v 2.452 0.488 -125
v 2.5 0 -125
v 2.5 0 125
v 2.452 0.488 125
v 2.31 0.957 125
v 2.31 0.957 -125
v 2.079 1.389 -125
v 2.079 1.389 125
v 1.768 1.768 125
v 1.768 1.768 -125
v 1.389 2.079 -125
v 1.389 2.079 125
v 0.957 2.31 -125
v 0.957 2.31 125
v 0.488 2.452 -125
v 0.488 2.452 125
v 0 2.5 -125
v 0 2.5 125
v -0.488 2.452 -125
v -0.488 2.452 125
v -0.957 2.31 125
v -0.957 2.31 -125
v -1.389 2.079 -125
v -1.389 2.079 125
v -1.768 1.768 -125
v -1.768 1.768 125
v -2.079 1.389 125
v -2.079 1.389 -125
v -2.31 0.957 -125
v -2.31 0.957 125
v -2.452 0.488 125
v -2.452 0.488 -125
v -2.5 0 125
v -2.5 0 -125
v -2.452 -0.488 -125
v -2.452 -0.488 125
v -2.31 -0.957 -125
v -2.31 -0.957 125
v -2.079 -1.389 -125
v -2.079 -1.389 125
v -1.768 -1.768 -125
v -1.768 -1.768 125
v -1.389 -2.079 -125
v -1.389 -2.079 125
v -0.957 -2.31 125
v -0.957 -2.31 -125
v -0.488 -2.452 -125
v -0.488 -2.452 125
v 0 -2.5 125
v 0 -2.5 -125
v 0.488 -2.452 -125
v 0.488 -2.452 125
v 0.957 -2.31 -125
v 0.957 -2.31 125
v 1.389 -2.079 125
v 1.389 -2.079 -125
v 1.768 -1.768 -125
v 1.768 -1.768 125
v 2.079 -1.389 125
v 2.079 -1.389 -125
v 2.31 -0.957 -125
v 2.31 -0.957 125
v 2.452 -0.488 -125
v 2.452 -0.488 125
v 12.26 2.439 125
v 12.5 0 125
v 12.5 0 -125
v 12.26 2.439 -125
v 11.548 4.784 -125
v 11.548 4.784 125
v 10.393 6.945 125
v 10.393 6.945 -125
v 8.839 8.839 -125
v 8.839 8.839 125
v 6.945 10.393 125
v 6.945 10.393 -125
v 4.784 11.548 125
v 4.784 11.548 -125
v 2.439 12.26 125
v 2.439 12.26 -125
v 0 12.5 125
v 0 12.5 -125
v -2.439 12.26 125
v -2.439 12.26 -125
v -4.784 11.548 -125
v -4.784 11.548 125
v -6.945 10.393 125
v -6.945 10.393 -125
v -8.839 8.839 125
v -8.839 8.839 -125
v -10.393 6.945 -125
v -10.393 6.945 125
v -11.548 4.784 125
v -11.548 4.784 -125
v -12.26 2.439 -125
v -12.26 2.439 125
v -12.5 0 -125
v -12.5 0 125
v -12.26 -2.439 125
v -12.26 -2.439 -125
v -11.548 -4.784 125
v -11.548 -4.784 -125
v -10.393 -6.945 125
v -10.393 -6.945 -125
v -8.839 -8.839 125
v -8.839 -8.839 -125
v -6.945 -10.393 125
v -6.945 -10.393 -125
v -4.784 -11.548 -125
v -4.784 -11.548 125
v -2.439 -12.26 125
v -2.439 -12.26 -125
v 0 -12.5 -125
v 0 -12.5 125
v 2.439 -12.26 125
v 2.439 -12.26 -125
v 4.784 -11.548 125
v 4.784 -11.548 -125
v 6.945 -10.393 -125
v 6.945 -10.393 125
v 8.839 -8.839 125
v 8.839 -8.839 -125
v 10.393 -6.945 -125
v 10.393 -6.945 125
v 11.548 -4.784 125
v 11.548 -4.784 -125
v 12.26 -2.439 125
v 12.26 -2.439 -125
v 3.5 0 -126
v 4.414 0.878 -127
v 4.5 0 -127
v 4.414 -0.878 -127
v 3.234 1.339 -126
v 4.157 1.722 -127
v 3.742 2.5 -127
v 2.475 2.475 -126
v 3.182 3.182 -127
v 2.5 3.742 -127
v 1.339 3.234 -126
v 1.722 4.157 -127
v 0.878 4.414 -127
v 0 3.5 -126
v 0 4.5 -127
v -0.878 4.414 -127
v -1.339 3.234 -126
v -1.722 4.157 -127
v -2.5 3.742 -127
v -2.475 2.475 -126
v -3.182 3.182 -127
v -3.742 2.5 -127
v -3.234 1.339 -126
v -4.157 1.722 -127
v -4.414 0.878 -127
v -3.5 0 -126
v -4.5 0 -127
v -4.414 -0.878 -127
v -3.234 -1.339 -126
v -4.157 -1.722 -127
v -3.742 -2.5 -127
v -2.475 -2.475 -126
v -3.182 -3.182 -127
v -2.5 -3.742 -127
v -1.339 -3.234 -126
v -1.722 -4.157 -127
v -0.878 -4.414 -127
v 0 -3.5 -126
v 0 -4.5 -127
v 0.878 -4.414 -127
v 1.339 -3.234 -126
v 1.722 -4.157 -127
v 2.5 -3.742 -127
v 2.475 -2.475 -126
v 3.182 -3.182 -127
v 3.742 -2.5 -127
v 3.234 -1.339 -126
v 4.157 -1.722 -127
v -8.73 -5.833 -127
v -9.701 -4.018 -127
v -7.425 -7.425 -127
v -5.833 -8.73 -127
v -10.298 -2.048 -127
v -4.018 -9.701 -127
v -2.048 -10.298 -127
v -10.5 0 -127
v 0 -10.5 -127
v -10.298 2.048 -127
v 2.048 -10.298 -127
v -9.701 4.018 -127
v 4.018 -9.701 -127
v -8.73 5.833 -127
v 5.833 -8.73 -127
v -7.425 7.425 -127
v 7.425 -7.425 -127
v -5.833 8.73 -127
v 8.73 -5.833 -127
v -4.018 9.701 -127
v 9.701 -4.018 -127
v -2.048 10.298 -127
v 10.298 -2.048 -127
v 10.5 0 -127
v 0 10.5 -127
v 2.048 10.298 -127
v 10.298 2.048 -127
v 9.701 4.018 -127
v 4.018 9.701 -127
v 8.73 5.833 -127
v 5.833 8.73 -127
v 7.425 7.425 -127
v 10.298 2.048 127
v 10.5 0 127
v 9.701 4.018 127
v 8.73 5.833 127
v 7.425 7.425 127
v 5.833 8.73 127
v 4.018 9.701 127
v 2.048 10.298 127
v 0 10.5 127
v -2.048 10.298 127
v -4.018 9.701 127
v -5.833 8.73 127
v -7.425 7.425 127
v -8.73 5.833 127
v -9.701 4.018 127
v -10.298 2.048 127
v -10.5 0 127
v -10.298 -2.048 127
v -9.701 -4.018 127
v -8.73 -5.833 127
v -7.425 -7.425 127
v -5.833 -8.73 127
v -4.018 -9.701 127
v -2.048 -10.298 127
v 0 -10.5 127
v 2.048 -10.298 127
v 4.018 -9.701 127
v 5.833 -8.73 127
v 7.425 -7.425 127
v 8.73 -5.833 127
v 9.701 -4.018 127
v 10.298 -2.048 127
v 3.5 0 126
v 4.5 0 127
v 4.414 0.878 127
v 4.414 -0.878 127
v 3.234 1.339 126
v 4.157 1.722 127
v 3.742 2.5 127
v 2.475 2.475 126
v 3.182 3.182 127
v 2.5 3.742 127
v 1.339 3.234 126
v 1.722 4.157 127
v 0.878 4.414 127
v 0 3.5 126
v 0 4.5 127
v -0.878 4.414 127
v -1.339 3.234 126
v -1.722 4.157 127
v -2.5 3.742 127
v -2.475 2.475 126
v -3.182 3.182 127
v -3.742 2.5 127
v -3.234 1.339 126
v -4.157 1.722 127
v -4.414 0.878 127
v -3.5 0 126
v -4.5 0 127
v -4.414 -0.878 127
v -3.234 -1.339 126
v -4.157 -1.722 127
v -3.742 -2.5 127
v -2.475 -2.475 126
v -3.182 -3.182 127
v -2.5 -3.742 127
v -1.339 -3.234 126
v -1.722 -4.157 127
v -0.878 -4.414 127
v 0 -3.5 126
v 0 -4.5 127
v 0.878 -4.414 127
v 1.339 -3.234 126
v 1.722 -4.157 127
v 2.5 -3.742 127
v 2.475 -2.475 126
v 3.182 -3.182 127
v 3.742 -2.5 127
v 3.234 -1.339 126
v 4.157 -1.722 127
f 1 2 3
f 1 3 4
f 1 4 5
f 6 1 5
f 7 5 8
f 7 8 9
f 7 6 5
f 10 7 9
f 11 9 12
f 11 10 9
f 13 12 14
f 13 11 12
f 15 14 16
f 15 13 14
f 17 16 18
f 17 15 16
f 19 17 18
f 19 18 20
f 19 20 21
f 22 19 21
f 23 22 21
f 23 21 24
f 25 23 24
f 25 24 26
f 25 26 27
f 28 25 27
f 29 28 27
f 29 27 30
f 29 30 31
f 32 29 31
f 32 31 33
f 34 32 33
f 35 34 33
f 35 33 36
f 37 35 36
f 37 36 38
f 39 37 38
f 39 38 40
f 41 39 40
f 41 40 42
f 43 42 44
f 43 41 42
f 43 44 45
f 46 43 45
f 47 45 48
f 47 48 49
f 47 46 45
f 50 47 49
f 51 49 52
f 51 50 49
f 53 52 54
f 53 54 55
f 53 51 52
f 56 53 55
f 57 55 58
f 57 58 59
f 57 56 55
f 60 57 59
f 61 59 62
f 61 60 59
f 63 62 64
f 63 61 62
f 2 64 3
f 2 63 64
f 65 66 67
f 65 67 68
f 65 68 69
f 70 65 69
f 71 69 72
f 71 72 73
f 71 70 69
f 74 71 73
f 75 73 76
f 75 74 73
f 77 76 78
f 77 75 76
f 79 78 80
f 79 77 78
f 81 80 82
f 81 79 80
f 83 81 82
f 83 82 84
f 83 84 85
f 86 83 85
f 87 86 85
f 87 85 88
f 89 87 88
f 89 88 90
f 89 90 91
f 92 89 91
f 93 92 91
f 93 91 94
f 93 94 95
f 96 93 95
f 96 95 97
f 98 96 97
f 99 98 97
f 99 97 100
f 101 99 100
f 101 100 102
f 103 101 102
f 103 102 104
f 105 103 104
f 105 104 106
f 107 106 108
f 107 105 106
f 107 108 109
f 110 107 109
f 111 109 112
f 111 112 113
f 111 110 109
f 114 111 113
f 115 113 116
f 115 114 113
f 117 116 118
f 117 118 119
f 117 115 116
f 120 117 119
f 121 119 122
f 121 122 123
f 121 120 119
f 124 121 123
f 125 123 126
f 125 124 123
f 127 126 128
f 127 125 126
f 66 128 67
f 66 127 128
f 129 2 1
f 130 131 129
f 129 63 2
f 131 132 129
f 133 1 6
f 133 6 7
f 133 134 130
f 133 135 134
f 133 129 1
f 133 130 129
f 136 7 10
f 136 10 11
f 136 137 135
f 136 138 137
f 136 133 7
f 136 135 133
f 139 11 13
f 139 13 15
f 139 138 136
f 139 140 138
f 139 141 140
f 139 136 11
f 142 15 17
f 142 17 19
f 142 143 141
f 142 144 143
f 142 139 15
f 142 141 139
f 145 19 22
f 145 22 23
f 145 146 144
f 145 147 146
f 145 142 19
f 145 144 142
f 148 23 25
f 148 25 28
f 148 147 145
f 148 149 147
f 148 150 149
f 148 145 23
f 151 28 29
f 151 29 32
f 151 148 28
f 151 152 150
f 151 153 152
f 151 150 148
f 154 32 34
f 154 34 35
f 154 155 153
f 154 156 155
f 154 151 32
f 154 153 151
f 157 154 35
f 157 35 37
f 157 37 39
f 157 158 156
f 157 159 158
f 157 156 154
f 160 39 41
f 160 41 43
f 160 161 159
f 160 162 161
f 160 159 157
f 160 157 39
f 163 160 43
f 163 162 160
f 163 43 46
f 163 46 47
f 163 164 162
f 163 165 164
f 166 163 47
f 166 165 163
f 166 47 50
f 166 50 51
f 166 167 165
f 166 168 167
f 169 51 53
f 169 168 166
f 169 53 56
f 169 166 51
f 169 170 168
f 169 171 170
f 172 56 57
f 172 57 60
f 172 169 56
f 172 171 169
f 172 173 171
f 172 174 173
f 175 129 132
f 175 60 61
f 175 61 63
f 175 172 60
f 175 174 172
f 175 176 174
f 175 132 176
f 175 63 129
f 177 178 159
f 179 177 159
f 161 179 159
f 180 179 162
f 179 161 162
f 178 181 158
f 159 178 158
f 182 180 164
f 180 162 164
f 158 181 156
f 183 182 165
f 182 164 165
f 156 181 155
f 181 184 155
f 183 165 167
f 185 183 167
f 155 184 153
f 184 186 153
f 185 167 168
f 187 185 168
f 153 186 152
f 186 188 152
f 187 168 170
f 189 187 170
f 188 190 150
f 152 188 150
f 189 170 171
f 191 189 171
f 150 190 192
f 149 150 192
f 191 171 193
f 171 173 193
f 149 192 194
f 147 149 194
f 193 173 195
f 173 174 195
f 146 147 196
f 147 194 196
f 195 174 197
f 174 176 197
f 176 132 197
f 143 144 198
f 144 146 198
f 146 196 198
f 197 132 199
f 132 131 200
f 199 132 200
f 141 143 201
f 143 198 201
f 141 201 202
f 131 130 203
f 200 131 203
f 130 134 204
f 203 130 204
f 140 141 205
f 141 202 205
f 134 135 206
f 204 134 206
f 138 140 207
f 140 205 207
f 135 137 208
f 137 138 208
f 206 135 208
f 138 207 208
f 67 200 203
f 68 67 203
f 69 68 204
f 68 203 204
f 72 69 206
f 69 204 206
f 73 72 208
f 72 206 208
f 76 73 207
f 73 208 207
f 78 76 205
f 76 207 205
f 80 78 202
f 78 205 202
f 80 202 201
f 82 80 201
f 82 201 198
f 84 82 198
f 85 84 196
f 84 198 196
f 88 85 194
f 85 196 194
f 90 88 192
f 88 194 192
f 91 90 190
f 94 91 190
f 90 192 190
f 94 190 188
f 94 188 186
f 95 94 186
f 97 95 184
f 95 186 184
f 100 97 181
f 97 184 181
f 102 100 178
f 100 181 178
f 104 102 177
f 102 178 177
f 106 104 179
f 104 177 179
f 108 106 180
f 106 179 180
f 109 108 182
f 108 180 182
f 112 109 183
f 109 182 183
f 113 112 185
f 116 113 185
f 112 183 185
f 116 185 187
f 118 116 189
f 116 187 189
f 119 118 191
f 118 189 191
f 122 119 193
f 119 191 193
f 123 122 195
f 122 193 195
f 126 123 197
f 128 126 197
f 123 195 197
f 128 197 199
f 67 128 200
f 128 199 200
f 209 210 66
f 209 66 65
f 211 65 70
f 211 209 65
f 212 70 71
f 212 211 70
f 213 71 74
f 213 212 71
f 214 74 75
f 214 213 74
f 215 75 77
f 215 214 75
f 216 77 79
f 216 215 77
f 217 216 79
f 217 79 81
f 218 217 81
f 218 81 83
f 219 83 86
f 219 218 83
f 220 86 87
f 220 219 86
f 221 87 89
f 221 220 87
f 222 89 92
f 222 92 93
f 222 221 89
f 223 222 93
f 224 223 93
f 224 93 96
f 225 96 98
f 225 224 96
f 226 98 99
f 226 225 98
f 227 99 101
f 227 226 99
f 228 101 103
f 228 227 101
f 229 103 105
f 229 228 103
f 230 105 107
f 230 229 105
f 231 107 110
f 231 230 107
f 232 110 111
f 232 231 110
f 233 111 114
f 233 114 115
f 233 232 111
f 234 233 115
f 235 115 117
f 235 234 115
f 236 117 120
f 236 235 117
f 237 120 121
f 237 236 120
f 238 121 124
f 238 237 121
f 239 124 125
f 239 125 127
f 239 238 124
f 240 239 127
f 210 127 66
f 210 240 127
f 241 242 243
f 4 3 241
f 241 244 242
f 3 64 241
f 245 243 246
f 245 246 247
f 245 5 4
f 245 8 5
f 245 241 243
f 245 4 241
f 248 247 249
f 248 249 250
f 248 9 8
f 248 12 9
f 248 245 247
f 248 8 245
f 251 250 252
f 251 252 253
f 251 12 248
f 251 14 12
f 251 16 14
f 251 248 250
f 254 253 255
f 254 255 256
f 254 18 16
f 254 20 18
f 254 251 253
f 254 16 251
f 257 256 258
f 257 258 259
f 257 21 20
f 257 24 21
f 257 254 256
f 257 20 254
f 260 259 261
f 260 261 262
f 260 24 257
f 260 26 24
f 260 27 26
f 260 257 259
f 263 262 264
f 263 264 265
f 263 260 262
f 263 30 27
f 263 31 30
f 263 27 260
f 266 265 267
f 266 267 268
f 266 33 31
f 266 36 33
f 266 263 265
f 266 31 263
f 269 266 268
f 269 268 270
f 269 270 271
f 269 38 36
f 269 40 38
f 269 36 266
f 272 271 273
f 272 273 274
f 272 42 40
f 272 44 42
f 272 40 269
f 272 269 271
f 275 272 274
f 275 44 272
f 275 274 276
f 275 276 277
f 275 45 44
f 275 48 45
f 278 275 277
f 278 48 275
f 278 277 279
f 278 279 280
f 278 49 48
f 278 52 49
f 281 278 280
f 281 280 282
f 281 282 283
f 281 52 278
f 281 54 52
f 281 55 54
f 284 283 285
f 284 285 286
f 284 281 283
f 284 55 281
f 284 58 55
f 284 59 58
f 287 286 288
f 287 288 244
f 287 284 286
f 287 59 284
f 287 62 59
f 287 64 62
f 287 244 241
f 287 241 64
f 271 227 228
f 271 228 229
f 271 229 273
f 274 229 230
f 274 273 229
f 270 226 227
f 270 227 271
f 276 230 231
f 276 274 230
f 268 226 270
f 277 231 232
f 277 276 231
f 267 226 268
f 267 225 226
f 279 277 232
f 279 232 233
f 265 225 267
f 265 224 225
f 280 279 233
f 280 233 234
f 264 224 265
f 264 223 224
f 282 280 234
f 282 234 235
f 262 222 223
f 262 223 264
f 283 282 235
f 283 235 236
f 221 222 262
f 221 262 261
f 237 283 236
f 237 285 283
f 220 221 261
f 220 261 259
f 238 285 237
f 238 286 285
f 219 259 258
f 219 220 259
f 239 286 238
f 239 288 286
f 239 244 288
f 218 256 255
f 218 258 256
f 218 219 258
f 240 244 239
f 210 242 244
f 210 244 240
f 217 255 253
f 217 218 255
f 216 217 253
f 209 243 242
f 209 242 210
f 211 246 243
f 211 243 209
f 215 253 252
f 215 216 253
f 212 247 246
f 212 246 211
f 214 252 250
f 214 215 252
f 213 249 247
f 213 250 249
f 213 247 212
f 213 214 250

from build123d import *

# Parameters (mm, degrees)
SKETCH1_R           = 12.5
SKETCH1_R_2         = 2.5
BOSS_EXTRUDE1_DEPTH = 127
CHAMFER1_SIZE       = 2


with BuildPart() as part:
    # Sketch1 → Boss-Extrude1 (new, symmetric)
    with BuildSketch(Plane.XY):
        Circle(SKETCH1_R)
        Circle(SKETCH1_R_2, mode=Mode.SUBTRACT)
    extrude(amount=BOSS_EXTRUDE1_DEPTH, both=True)

    # Chamfer1
    chamfer1_edges = [part.edges().sort_by_distance(p)[0] for p in [
        (-12.5, 0, -127),
        (-12.5, 0, 127),
        (-2.5, 0, -127),
        (-2.5, 0, 127),
    ]]
    chamfer(chamfer1_edges, length=CHAMFER1_SIZE)


solid = part.part
